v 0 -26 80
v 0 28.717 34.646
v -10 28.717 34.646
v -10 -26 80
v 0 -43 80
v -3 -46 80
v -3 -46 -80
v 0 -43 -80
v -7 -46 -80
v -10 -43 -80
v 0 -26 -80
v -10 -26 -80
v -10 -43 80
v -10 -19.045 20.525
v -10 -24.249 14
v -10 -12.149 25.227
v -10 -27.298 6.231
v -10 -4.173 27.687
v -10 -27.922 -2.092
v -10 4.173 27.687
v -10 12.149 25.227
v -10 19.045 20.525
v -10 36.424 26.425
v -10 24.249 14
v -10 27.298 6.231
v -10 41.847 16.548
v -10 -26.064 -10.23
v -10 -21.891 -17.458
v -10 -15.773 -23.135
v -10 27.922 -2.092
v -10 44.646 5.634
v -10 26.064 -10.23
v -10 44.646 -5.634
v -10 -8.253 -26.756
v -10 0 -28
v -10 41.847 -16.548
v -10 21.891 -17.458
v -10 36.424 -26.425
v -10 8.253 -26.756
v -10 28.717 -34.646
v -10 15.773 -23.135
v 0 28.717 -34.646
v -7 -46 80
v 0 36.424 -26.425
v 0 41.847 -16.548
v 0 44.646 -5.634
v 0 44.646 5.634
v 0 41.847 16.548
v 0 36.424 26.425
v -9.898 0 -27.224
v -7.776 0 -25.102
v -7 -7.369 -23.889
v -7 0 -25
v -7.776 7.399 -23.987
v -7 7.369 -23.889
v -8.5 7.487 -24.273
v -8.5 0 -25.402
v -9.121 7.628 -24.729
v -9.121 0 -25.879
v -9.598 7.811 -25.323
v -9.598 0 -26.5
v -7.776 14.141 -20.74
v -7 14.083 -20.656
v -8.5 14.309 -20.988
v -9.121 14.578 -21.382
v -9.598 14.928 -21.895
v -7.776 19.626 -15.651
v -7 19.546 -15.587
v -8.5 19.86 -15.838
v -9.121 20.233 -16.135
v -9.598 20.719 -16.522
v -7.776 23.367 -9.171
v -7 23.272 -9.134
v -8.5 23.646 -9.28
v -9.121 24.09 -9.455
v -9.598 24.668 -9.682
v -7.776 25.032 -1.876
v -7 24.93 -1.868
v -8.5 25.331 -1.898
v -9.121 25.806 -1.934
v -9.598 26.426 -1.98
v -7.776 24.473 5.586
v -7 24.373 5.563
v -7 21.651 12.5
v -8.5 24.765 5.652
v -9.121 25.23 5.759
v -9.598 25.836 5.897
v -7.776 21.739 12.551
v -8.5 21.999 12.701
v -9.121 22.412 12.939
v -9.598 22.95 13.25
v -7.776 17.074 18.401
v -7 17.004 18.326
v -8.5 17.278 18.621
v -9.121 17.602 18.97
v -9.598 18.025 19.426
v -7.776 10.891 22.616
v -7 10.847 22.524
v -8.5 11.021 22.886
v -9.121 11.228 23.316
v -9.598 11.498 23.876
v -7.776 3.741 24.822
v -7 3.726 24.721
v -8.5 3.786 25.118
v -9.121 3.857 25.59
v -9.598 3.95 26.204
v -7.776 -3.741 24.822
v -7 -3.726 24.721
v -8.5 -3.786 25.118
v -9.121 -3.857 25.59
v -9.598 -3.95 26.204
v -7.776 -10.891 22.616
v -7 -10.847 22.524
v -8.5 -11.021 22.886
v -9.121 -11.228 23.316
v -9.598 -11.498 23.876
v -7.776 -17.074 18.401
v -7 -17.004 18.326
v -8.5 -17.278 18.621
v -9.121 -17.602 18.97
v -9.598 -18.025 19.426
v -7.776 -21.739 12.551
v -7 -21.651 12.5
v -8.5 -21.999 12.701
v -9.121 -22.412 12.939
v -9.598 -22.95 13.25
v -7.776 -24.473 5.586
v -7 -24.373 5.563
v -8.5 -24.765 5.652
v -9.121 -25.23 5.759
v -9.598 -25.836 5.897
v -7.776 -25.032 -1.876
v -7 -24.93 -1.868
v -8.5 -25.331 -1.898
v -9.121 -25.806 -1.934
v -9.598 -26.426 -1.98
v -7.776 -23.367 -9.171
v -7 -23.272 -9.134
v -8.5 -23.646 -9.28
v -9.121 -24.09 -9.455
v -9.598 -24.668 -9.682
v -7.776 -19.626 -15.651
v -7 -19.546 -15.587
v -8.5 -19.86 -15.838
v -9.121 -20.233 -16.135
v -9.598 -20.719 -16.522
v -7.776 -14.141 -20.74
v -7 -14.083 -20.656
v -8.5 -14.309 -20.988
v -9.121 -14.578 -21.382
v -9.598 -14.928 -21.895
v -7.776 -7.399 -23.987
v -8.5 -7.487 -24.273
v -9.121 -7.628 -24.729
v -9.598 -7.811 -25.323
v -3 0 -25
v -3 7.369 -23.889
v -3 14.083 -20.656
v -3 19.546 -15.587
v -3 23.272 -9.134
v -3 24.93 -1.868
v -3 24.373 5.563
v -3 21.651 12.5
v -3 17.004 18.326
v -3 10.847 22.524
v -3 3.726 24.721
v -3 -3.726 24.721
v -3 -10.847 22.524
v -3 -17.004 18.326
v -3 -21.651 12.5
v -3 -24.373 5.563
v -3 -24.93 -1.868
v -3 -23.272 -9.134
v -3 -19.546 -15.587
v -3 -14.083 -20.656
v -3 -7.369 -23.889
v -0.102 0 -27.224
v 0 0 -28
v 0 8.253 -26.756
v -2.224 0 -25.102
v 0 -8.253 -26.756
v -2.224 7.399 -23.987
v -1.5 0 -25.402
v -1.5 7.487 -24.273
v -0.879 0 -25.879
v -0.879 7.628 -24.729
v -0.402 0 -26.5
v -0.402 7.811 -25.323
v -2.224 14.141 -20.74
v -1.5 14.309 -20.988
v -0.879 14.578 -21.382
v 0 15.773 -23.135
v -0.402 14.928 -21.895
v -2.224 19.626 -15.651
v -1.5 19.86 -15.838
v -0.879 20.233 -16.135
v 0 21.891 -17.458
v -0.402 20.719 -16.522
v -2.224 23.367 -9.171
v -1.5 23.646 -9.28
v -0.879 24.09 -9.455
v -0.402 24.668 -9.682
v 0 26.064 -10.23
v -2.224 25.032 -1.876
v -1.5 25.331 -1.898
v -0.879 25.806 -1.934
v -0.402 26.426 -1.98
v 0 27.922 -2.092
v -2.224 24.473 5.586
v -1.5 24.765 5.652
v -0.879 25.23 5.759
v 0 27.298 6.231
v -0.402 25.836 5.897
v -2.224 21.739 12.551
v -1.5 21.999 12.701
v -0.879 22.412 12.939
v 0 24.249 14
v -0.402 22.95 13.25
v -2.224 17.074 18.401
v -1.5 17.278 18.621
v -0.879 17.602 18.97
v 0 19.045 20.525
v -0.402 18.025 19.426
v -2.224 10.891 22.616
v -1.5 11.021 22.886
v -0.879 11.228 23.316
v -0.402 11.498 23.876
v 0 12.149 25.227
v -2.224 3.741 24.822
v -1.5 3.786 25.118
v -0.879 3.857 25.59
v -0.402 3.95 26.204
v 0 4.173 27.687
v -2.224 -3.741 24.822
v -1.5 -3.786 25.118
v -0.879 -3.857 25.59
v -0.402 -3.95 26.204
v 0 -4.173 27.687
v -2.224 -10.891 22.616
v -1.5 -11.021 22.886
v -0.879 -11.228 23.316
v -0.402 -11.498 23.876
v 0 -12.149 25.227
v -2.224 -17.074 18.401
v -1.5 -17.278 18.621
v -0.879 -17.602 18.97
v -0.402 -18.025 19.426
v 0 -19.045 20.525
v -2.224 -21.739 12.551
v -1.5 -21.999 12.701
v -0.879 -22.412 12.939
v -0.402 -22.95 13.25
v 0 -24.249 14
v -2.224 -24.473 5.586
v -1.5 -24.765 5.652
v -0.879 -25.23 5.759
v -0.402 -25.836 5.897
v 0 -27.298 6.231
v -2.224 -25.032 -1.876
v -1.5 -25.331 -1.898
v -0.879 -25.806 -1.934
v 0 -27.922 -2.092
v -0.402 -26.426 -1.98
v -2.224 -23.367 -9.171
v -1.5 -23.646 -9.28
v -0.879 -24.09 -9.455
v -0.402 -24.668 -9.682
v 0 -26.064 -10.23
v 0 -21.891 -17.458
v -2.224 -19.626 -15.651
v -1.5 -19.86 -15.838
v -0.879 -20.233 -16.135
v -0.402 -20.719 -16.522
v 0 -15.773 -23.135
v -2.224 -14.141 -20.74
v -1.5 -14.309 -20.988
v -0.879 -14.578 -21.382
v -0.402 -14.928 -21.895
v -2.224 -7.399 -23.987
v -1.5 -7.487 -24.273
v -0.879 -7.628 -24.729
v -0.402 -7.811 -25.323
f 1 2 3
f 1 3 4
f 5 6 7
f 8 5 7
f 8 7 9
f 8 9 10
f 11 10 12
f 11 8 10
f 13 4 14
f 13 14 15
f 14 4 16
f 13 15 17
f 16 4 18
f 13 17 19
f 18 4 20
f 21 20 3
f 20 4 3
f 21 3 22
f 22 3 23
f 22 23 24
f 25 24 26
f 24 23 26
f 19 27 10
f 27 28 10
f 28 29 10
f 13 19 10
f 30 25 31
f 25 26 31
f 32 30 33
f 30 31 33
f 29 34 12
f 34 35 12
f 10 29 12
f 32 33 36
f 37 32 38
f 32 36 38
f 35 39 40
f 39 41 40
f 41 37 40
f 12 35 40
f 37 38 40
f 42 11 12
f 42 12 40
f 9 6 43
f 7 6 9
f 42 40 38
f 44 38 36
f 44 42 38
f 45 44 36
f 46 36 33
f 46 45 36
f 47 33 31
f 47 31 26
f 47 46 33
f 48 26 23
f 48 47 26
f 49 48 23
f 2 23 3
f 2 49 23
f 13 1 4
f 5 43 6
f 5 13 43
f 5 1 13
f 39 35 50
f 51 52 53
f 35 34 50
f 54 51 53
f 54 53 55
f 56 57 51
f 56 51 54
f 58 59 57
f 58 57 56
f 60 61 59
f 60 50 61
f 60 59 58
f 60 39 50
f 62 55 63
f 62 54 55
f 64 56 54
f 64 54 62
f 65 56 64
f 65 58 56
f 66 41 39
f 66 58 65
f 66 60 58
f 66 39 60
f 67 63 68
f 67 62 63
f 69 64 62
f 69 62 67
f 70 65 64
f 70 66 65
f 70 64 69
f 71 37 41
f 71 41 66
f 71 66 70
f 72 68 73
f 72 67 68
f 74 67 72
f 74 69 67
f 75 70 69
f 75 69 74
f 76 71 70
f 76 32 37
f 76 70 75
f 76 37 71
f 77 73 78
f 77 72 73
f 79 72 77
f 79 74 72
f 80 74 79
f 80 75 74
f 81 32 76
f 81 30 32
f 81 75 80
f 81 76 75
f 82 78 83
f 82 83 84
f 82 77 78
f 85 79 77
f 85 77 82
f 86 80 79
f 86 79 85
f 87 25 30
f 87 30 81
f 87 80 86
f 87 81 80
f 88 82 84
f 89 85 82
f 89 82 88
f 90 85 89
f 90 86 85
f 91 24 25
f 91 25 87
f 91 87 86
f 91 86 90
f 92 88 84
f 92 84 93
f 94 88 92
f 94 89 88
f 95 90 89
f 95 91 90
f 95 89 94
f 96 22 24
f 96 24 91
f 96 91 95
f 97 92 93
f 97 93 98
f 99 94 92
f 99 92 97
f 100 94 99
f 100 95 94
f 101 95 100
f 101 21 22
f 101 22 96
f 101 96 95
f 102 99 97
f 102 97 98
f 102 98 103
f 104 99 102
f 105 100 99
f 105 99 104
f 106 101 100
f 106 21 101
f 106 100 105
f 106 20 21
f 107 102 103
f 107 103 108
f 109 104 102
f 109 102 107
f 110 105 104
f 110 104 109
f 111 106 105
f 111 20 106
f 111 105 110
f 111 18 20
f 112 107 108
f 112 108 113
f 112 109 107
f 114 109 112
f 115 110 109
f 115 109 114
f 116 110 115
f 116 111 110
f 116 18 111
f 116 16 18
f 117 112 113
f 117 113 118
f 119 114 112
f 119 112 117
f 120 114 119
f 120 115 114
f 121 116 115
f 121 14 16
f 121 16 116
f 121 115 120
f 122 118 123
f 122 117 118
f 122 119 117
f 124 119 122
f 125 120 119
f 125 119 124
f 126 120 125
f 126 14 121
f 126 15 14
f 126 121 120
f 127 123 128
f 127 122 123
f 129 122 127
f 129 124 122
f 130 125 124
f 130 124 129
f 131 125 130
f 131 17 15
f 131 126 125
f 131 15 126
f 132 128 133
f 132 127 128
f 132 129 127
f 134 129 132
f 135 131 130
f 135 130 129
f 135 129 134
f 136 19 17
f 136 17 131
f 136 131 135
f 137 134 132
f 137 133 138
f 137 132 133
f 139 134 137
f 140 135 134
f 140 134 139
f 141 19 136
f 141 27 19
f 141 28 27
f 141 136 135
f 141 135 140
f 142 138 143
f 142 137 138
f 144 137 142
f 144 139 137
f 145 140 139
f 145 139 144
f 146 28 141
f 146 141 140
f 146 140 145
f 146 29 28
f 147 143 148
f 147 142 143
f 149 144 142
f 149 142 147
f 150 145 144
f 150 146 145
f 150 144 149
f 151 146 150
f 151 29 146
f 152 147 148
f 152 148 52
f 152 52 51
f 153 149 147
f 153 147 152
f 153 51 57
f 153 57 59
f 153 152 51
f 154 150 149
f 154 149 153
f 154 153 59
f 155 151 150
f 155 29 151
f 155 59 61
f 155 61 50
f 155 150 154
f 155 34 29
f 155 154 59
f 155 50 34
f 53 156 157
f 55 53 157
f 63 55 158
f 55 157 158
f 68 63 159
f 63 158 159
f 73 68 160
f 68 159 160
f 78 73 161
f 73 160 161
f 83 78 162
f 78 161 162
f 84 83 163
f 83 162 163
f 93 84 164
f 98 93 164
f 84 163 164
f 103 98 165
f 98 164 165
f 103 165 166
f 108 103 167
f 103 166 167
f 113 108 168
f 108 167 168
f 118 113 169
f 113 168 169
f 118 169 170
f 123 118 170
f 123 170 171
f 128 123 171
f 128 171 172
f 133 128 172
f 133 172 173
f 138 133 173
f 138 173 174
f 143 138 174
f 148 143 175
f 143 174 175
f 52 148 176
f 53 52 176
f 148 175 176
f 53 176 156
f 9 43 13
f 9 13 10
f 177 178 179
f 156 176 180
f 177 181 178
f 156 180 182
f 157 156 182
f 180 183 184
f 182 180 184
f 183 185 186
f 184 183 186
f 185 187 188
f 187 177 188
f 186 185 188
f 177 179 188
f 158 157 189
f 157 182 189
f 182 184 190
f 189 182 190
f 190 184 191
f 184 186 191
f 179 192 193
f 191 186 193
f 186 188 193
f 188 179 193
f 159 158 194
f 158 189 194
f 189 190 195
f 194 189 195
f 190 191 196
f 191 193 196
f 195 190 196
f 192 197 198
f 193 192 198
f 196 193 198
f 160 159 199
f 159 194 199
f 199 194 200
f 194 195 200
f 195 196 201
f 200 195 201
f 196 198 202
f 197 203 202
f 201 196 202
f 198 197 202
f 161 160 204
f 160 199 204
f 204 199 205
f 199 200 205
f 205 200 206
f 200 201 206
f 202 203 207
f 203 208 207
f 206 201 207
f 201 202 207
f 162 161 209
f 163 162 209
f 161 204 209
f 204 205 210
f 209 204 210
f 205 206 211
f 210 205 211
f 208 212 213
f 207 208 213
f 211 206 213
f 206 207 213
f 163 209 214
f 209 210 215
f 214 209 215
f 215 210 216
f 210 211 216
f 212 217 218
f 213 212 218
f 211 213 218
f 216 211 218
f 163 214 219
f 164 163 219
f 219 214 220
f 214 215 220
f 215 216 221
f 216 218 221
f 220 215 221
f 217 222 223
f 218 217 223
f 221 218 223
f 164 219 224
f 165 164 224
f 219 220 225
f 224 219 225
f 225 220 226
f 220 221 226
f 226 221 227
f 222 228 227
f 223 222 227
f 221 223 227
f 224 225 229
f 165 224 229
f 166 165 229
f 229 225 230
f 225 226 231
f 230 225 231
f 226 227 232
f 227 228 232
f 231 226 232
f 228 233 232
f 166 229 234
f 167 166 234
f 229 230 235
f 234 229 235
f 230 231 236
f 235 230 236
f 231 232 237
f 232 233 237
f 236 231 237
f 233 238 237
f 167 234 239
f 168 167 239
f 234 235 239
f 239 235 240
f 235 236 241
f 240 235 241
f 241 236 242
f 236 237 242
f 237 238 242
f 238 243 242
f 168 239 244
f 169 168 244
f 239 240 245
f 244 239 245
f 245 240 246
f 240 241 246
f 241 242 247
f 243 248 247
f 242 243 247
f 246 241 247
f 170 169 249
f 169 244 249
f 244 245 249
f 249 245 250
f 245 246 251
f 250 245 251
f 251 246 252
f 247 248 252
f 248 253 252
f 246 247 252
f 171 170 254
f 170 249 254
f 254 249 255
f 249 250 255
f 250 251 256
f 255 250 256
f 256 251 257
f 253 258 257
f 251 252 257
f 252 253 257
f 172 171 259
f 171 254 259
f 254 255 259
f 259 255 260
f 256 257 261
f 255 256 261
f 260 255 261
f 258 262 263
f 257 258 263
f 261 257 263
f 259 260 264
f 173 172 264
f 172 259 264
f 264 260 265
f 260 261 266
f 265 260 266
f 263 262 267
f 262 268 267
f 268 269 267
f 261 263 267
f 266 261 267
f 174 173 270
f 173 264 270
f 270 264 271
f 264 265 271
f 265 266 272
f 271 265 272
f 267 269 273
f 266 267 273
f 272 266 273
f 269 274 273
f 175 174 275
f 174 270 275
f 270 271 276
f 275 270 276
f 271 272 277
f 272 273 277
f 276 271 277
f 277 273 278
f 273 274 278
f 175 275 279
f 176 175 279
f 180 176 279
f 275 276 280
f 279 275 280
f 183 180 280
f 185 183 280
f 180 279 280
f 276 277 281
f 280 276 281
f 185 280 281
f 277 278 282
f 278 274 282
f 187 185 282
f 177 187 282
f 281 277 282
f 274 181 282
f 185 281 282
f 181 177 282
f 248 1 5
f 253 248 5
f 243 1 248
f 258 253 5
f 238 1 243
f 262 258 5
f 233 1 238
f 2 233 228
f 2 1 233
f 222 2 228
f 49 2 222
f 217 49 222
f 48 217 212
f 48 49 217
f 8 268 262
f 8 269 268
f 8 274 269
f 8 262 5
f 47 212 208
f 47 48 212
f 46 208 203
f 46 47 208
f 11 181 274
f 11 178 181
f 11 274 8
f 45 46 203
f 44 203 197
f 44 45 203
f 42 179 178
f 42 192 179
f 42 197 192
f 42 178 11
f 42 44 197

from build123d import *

# Parameters (mm, degrees)
SKETCH1_R          = 25
BASE_FLANGE1_DEPTH = 10
FILLET1_R          = 3
CHAMFER1_SIZE      = 3


# Sheet-metal steps are written as plain solids
with BuildPart() as part:
    # Sketch1 → Base-Flange1 (new body)
    with BuildSketch(Plane(origin=(0, 0, 0), x_dir=(0, 0, -1), z_dir=(1, 0, 0))):
        with BuildLine():
            Line((-80, -46), (80, -46))
            Line((80, -46), (80, -26))
            Line((80, -26), (34.645612429, 28.717269011))
            ThreePointArc((34.645612429, 28.717269011), (0, 45), (-34.645612429, 28.717269011))
            Line((-34.645612429, 28.717269011), (-80, -26))
            Line((-80, -26), (-80, -46))
        make_face()
        Circle(SKETCH1_R, mode=Mode.SUBTRACT)
    extrude(amount=-BASE_FLANGE1_DEPTH)

    # Fillet1
    fillet1_edges = [part.edges().sort_by_distance(p)[0] for p in [
        (-10, 0, 25),
        (0, 0, 25),
    ]]
    fillet(fillet1_edges, radius=FILLET1_R)

    # Chamfer1
    chamfer1_edges = [part.edges().sort_by_distance(p)[0] for p in [
        (-10, -46, 0),
        (0, -46, 0),
    ]]
    chamfer(chamfer1_edges, length=CHAMFER1_SIZE)


solid = part.part
